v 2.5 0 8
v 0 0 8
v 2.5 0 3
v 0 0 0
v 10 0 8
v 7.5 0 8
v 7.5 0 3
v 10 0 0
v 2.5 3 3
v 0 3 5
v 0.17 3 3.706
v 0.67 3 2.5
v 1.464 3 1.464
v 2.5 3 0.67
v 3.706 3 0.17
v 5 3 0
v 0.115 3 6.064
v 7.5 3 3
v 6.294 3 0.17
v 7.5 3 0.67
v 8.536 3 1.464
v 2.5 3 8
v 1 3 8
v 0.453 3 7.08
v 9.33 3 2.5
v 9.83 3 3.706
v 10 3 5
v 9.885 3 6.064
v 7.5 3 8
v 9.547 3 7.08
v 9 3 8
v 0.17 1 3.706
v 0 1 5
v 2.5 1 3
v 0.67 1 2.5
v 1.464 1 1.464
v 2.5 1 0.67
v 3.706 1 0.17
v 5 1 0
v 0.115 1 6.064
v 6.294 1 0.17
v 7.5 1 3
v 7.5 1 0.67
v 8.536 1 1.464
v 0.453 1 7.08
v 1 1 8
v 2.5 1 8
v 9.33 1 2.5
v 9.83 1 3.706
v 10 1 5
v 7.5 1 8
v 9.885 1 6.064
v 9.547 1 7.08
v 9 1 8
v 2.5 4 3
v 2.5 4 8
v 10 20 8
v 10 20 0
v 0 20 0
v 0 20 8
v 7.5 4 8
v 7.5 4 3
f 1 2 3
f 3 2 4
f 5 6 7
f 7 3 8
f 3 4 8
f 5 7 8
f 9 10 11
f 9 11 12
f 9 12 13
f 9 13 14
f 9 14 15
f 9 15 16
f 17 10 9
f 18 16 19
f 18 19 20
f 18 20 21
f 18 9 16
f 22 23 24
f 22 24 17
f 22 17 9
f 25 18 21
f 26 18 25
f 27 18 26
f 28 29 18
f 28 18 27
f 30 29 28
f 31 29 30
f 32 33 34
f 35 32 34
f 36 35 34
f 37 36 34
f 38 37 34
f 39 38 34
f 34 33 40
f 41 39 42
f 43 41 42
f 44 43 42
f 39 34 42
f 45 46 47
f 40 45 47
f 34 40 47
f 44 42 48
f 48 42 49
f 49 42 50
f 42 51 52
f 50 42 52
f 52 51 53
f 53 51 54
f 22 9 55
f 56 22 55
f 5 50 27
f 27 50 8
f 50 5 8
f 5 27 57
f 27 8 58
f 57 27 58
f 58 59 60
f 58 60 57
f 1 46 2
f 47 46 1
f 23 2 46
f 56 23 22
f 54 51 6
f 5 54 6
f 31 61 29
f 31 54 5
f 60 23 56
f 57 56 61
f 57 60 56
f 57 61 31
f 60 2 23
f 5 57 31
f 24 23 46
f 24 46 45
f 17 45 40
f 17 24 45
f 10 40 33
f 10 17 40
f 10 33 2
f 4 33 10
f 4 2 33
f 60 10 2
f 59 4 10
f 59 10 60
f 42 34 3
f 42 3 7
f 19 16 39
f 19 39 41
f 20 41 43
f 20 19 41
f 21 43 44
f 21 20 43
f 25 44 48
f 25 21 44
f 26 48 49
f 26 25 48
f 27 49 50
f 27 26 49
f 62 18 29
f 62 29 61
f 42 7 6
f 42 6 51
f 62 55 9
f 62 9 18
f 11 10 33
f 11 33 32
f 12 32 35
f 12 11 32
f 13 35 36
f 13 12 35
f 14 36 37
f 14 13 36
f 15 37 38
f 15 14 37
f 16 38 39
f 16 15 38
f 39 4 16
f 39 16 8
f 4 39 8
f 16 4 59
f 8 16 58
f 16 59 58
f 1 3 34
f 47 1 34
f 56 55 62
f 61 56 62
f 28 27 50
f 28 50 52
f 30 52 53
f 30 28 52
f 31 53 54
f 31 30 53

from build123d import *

# Parameters (mm, degrees)
BOX002_W            = 5
BOX002_H            = 1
BOX002_DEPTH        = 5
BOX001_W            = 5
BOX001_H            = 1
BOX001_DEPTH        = 5
CYLINDER_R          = 5
CYLINDER_DEPTH      = 2
CYLINDER_ROLL_ANGLE = 90
BOX_W               = 10
BOX_H               = 20
BOX_DEPTH           = 8


with BuildPart() as interior_opening:
    # Box002 → Box002 (new body)
    with BuildSketch(Plane(origin=(2.5, 3, 3), x_dir=(1, 0, 0), z_dir=(0, 0, 1))):
        with Locations((2.5, 0.5)):
            Rectangle(BOX002_W, BOX002_H)
    extrude(amount=BOX002_DEPTH)


with BuildPart() as end_opening:
    # Box001 → Box001 (new body)
    with BuildSketch(Plane(origin=(2.5, 0, 3), x_dir=(1, 0, 0), z_dir=(0, 0, 1))):
        with Locations((2.5, 0.5)):
            Rectangle(BOX001_W, BOX001_H)
    extrude(amount=BOX001_DEPTH)


with BuildPart() as solenoid_head_slot:
    # Cylinder → Cylinder (new body)
    with BuildSketch(Plane.XY):
        Circle(CYLINDER_R)
    extrude(amount=CYLINDER_DEPTH)


with BuildPart() as solenoid_head_slot_1:
    # Cylinder roll: moved
    add(solenoid_head_slot.part.rotate(Axis((0, 0, 0), (1, 0, 0)), CYLINDER_ROLL_ANGLE))


with BuildPart() as solenoid_head_slot_2:
    # Cylinder placement: moved
    add(solenoid_head_slot_1.part.moved(Location((5, 3, 5))))


with BuildPart() as cut002:
    # Box → Box (new body)
    with BuildSketch(Plane.XY):
        with Locations((5, 10)):
            Rectangle(BOX_W, BOX_H)
    extrude(amount=BOX_DEPTH)

    # Cut: cut solenoid_head_slot
    add(solenoid_head_slot_2.part, mode=Mode.SUBTRACT)

    # Cut001: cut end_opening
    add(end_opening.part, mode=Mode.SUBTRACT)

    # Cut002: cut interior_opening
    add(interior_opening.part, mode=Mode.SUBTRACT)


solid = cut002.part
